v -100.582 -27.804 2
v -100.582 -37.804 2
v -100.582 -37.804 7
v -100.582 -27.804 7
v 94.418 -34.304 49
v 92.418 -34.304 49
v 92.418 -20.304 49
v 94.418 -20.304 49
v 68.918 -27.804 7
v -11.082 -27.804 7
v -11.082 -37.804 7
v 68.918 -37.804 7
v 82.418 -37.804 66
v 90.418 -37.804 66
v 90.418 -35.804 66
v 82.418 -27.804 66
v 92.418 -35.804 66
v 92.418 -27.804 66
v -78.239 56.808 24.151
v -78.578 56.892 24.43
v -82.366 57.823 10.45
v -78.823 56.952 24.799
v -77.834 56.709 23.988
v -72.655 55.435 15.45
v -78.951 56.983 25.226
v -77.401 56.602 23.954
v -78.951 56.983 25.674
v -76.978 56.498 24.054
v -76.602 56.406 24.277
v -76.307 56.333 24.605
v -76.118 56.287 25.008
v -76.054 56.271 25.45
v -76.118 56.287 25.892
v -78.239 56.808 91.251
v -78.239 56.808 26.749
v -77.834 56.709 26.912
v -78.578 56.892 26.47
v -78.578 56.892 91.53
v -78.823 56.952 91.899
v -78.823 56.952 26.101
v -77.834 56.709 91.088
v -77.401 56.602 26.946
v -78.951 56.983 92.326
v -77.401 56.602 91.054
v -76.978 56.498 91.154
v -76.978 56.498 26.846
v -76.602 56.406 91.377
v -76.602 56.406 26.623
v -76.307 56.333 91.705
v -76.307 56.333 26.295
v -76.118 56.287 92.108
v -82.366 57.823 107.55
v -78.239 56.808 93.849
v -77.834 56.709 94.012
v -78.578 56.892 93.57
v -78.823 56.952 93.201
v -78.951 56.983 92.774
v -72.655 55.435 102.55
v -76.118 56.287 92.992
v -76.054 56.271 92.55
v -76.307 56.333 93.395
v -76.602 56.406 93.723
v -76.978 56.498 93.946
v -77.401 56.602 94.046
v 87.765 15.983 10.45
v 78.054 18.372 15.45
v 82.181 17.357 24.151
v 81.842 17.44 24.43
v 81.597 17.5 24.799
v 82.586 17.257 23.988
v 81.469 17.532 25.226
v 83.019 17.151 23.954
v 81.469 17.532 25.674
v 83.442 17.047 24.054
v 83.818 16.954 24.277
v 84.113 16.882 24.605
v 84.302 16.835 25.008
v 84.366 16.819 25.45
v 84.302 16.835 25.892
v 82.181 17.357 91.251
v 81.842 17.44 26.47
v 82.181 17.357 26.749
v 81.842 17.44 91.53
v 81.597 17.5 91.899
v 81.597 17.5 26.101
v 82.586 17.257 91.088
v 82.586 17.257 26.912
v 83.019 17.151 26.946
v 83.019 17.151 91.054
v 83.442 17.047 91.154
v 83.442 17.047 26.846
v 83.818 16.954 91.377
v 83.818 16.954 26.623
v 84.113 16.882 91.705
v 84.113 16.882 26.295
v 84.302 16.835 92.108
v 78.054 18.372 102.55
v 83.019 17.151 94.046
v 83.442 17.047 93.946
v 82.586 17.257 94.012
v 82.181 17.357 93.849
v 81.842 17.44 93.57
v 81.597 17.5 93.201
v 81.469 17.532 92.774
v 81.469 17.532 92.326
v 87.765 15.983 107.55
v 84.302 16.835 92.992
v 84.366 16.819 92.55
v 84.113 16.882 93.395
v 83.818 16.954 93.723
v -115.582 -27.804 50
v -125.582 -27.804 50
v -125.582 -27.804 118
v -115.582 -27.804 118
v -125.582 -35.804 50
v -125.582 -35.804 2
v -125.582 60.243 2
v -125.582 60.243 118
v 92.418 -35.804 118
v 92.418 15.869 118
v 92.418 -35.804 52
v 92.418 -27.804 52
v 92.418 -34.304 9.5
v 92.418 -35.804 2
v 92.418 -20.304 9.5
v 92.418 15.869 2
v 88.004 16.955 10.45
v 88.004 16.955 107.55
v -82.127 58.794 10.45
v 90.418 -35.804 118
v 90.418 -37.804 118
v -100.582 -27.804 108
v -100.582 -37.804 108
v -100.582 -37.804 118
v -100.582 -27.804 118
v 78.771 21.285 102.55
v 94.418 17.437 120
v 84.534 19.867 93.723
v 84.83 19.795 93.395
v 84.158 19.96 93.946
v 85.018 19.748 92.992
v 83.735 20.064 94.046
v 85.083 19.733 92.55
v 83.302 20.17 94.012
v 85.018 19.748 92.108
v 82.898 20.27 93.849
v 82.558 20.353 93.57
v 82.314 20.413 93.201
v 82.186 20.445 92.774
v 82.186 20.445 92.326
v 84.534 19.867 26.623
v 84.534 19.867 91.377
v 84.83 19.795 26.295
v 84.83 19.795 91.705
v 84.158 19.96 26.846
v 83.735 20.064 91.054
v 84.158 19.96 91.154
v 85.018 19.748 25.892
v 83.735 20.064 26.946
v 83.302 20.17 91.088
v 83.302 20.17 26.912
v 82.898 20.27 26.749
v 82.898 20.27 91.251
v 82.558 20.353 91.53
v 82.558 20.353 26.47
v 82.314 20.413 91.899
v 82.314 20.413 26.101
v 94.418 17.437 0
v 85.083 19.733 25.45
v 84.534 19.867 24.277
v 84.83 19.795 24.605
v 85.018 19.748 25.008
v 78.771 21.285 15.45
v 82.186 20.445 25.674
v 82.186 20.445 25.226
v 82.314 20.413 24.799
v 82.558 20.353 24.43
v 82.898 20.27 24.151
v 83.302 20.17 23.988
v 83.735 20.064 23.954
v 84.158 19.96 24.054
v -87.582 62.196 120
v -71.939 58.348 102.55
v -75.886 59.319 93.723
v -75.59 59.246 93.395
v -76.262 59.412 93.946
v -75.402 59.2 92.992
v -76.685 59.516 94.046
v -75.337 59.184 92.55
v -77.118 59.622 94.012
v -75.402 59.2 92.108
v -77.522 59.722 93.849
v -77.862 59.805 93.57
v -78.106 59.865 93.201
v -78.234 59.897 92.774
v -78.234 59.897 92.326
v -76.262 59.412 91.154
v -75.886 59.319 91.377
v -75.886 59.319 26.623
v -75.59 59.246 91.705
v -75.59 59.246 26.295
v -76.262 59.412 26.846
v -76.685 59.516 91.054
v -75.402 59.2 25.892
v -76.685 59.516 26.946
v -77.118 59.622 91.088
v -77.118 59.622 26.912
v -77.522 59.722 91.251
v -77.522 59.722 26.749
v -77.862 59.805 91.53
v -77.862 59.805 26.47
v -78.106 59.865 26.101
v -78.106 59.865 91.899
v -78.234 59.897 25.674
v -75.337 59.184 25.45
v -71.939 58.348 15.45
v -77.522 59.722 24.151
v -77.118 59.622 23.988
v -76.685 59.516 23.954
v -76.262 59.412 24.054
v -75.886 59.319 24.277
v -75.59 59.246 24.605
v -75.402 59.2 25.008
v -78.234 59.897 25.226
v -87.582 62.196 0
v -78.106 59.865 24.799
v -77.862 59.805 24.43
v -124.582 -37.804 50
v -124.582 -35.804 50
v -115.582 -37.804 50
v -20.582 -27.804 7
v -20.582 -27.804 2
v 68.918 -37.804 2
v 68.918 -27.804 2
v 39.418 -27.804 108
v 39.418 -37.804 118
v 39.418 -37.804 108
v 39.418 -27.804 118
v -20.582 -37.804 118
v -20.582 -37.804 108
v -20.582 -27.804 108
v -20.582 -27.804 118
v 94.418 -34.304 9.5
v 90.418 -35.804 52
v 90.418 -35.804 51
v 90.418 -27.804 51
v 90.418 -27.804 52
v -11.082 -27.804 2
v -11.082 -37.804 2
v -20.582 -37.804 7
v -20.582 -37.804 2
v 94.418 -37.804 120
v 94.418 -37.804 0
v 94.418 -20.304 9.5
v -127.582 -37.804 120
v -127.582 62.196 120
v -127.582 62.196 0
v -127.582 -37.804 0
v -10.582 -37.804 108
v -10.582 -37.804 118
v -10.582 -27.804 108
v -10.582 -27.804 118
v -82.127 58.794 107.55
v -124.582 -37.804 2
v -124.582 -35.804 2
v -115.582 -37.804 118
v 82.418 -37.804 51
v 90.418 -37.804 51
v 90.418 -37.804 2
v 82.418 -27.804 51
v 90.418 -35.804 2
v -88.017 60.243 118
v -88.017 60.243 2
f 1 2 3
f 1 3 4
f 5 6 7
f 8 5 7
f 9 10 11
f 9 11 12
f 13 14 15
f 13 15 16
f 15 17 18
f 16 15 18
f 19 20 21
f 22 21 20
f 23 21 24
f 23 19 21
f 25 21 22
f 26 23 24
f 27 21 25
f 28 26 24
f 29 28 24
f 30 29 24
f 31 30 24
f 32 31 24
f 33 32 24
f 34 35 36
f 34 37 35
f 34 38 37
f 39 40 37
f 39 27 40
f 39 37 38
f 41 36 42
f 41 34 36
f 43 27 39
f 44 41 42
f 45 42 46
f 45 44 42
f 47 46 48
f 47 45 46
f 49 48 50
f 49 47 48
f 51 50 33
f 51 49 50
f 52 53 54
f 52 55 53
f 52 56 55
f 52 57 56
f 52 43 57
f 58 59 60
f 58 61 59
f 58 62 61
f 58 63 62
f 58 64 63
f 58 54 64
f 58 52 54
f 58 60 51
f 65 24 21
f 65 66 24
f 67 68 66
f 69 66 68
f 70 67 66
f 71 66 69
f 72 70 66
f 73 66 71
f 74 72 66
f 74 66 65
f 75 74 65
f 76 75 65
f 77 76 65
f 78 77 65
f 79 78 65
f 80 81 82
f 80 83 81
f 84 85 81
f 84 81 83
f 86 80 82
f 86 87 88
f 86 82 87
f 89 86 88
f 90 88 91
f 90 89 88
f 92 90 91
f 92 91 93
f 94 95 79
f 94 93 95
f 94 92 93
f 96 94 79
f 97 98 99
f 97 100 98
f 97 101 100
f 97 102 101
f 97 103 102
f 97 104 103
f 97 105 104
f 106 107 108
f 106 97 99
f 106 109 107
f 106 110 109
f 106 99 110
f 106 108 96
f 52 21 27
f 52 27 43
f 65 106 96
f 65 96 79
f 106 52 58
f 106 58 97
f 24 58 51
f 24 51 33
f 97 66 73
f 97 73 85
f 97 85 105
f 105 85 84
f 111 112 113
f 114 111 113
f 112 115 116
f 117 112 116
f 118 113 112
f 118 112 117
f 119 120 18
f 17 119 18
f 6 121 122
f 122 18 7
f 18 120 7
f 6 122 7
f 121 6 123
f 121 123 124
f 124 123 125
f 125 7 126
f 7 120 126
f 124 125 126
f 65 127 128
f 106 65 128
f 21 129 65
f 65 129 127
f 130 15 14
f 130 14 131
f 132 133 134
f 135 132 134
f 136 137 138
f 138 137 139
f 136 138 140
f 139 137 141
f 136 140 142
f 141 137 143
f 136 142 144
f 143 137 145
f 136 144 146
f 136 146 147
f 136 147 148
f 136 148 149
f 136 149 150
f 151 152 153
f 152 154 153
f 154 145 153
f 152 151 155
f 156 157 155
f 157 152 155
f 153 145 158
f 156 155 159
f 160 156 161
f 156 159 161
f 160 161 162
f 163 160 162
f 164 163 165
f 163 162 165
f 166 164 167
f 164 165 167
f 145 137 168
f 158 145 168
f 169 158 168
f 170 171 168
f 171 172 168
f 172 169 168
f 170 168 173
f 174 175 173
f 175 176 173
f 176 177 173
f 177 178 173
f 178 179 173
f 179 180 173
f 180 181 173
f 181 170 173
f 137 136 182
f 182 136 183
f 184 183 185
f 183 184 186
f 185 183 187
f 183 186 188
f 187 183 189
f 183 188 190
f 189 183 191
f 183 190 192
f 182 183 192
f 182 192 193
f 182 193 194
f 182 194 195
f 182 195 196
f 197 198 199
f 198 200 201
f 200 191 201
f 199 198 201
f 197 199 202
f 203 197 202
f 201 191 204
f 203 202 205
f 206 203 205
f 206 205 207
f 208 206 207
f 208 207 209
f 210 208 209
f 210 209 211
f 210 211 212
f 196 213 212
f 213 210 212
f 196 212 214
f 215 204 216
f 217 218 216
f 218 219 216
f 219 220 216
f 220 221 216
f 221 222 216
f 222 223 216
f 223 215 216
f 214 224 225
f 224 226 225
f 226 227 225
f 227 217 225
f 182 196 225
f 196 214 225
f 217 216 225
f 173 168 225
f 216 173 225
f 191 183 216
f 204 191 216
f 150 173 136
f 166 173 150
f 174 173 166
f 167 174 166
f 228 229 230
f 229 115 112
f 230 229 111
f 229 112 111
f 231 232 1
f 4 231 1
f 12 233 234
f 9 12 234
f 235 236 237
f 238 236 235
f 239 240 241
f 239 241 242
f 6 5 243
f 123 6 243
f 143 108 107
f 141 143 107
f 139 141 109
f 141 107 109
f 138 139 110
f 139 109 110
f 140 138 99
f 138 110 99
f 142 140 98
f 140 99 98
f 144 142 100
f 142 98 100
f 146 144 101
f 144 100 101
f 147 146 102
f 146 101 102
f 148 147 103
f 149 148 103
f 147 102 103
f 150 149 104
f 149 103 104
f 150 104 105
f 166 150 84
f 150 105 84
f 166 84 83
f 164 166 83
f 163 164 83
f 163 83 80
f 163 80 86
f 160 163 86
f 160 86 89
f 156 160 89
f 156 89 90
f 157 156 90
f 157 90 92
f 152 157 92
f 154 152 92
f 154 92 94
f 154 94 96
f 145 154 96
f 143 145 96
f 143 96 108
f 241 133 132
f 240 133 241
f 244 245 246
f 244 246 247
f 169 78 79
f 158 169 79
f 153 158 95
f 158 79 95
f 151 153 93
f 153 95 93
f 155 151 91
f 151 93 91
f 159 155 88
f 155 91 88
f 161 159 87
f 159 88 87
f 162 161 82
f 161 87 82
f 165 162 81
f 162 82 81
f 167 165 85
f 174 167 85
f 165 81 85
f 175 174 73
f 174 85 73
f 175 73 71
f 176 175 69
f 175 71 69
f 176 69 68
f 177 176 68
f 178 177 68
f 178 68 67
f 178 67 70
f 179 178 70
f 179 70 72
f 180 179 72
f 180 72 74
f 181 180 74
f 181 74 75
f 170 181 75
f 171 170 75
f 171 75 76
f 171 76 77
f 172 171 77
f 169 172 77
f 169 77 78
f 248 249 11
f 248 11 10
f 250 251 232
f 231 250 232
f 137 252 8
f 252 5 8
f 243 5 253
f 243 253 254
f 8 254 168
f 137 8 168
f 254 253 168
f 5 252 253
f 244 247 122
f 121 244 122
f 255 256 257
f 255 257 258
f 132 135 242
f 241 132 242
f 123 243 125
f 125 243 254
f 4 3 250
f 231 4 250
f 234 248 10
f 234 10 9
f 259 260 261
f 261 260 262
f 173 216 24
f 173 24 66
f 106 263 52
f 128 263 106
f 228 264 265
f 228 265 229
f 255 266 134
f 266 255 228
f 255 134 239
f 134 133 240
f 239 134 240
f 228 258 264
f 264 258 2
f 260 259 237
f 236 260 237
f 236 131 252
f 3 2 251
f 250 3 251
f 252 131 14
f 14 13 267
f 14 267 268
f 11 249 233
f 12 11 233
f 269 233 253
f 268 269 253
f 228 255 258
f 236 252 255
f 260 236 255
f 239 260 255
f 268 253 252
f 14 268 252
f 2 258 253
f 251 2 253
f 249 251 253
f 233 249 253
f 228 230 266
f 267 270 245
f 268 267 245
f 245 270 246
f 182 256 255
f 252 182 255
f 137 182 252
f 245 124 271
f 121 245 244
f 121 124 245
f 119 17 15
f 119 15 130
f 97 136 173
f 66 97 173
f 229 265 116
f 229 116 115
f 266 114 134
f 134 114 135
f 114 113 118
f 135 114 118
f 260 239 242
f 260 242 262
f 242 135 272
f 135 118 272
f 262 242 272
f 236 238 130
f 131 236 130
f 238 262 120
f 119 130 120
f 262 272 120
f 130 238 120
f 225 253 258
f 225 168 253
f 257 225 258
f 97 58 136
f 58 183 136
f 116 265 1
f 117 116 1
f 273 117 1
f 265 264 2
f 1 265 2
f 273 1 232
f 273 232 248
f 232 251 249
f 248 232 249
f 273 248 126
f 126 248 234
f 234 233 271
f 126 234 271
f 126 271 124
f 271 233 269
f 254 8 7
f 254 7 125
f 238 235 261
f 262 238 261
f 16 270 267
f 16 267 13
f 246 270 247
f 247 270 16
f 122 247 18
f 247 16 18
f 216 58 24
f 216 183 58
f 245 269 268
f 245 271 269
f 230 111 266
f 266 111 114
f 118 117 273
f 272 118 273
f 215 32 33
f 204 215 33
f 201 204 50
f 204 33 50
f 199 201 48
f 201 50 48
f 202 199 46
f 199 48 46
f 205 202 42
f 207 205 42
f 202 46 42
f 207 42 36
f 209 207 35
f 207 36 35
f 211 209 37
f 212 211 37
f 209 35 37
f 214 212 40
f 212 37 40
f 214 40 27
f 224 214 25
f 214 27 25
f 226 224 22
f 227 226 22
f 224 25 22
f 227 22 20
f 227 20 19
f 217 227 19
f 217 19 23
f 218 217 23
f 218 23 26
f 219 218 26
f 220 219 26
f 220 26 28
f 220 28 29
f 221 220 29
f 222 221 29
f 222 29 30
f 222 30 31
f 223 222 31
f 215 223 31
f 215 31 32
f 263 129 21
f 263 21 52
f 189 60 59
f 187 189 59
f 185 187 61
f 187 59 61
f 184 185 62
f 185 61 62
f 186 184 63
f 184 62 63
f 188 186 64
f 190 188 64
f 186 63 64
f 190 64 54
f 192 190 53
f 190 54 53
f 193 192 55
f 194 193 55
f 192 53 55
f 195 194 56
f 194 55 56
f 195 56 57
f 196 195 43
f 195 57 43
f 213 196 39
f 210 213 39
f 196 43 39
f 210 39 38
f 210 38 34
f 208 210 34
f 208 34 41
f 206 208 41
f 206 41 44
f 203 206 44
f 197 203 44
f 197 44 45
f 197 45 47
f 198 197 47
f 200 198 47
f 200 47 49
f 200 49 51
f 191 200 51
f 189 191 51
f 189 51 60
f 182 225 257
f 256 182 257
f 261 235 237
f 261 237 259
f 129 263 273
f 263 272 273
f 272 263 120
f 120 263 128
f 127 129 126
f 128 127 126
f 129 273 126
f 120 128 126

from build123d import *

# Parameters (mm, degrees)
BOSS_EXTRUDE1_DEPTH  = 118
SKETCH2_W            = 68
SKETCH2_H            = 10
BOSS_EXTRUDE2_DEPTH  = 12
SKETCH4_W            = 2
SKETCH4_H            = 5.241203994
BOSS_EXTRUDE4_DEPTH  = 118
SKETCH5_W            = 40
SKETCH5_H            = 14
CUT_EXTRUDE1_DEPTH   = 12
BOSS_EXTRUDE5_START  = -2
SKETCH6_W            = 0.5
SKETCH6_H            = 14
BOSS_EXTRUDE5_DEPTH  = 2
SKETCH7_W            = 118
SKETCH7_H            = 2
BOSS_EXTRUDE6_DEPTH  = 2
SKETCH8_W            = 2
SKETCH8_H            = 0.649840642
BOSS_EXTRUDE7_DEPTH  = 50
BOSS_EXTRUDE8_DEPTH  = 2
SKETCH11_W           = 222
SKETCH11_H           = 2
BOSS_EXTRUDE9_DEPTH  = 2
SKETCH13_W           = 118
SKETCH13_H           = 2
BOSS_EXTRUDE10_DEPTH = 4
SKETCH14_W           = 1
SKETCH14_H           = 46
CUT_EXTRUDE2_DEPTH   = 4
SKETCH15_W           = 215
SKETCH15_H           = 1
CUT_EXTRUDE3_DEPTH   = 4
SKETCH16_W           = 215
SKETCH16_H           = 1
CUT_EXTRUDE4_DEPTH   = 4
SKETCH17_W           = 155.2
SKETCH17_H           = 87.1
CUT_EXTRUDE5_DEPTH   = 4
SKETCH18_W           = 175.2
SKETCH18_H           = 97.1
BOSS_EXTRUDE11_DEPTH = 1
SKETCH19_W           = 155.2
SKETCH19_H           = 87.1
CUT_EXTRUDE6_DEPTH   = 1
SKETCH20_R           = 1.5
CUT_EXTRUDE7_DEPTH   = 47.46373967
SKETCH21_W           = 80
SKETCH21_H           = 10
BOSS_EXTRUDE12_DEPTH = 12
SKETCH22_W           = 80
SKETCH22_H           = 5
CUT_EXTRUDE8_DEPTH   = 12
SKETCH23_W           = 10
SKETCH23_H           = 10
BOSS_EXTRUDE13_DEPTH = 12
BOSS_EXTRUDE14_START = -10
SKETCH24_W           = 12
SKETCH24_H           = 4
BOSS_EXTRUDE14_DEPTH = 10
BOSS_EXTRUDE15_START = -10
SKETCH25_W           = 8
SKETCH25_H           = 1
BOSS_EXTRUDE15_DEPTH = 10
SKETCH27_W           = 80
SKETCH27_H           = 10
BOSS_EXTRUDE16_DEPTH = 5
BOSS_EXTRUDE17_DEPTH = 2
SKETCH30_W           = 80
SKETCH30_H           = 10
BOSS_EXTRUDE18_DEPTH = 10
SKETCH31_W           = 50
SKETCH31_H           = 11.87067785
BOSS_EXTRUDE20_DEPTH = 10
SKETCH32_W           = 50
SKETCH32_H           = 1.87
CUT_EXTRUDE9_DEPTH   = 10


with BuildPart() as part:
    # Sketch1 → Boss-Extrude1 (new body)
    with BuildSketch(Plane.XY):
        Polygon((94.417554234, -32.563143832), (94.417554234, 17.436856168), (-87.582445766, 62.195652174), (-127.582445766, 62.195652174), (-127.582445766, -37.804347826), (-125.582445766, -37.757129772), (-125.582445766, 60.242870228), (-88.016763075, 60.242870228), (92.417554234, 15.869118575), (92.417554234, 15.389638114), (92.417554234, -32.610361886), align=None)
    extrude(amount=BOSS_EXTRUDE1_DEPTH)

    # Sketch2 → Boss-Extrude2 (add)
    with BuildSketch(Plane.ZY.offset(127.582445766)):
        with Locations((84, -32.804347826)):
            Rectangle(SKETCH2_W, SKETCH2_H)
    extrude(amount=-BOSS_EXTRUDE2_DEPTH)

    # Sketch4 → Boss-Extrude4 (add)
    with BuildSketch(Plane.XY.offset(118)):
        with Locations((93.417554234, -35.183745829)):
            Rectangle(SKETCH4_W, SKETCH4_H)
    extrude(amount=-BOSS_EXTRUDE4_DEPTH)

    # Sketch5 → Cut-Extrude1 (cut)
    with BuildSketch(Plane(origin=(94.417554234, 0, 0), x_dir=(0, 0, -1), z_dir=(1, 0, 0))):
        with Locations((-29.5, -27.304347826)):
            Rectangle(SKETCH5_W, SKETCH5_H)
    extrude(amount=-CUT_EXTRUDE1_DEPTH, mode=Mode.SUBTRACT)

    # Sketch6 → Boss-Extrude5 (add)
    with BuildSketch(Plane(origin=(94.417554234, 0, 0), x_dir=(0, 0, -1), z_dir=(1, 0, 0)).offset(BOSS_EXTRUDE5_START)):
        with Locations((-49.25, -27.304347826)):
            Rectangle(SKETCH6_W, SKETCH6_H)
    extrude(amount=BOSS_EXTRUDE5_DEPTH)

    # Sketch7 → Boss-Extrude6 (add)
    with BuildSketch(Plane.ZY.offset(-92.417554234)):
        with Locations((59, -36.804347826)):
            Rectangle(SKETCH7_W, SKETCH7_H)
    extrude(amount=BOSS_EXTRUDE6_DEPTH)

    # Sketch8 → Boss-Extrude7 (add)
    with BuildSketch(Plane(origin=(0, 0, 50), x_dir=(-1, 0, 0), z_dir=(0, 0, -1))):
        with Locations((126.582445766, -37.479427505)):
            Rectangle(SKETCH8_W, SKETCH8_H)
    extrude(amount=BOSS_EXTRUDE7_DEPTH)

    # Sketch10 → Boss-Extrude8 (add)
    with BuildSketch(Plane(origin=(0, 0, 0), x_dir=(-1, 0, 0), z_dir=(0, 0, -1))):
        Polygon((-94.417554234, 17.436856168), (87.582445766, 62.195652174), (127.582445766, 62.195652174), (127.582445766, -37.804347826), (-94.417554234, -37.804347826), align=None)
    extrude(amount=-BOSS_EXTRUDE8_DEPTH)

    # Sketch11 → Boss-Extrude9 (add)
    with BuildSketch(Plane.XY.offset(2)):
        with Locations((-16.582445766, -36.804347826)):
            Rectangle(SKETCH11_W, SKETCH11_H)
    extrude(amount=BOSS_EXTRUDE9_DEPTH)

    # Sketch13 → Boss-Extrude10 (add)
    with BuildSketch(Plane.ZY.offset(127.582445766)):
        with Locations((59, -36.804347826)):
            Rectangle(SKETCH13_W, SKETCH13_H)
    extrude(amount=-BOSS_EXTRUDE10_DEPTH)

    # Sketch14 → Cut-Extrude2 (cut)
    with BuildSketch(Plane(origin=(0, -35.804347826, 0), x_dir=(1, 0, 0), z_dir=(0, 1, 0))):
        with Locations((-124.082445766, -27)):
            Rectangle(SKETCH14_W, SKETCH14_H)
    extrude(amount=-CUT_EXTRUDE2_DEPTH, mode=Mode.SUBTRACT)

    # Sketch15 → Cut-Extrude3 (cut)
    with BuildSketch(Plane.XZ.offset(37.804347826)):
        with Locations((-17.082445766, 3.5)):
            Rectangle(SKETCH15_W, SKETCH15_H)
    extrude(amount=-CUT_EXTRUDE3_DEPTH, mode=Mode.SUBTRACT)

    # Sketch16 → Cut-Extrude4 (cut)
    with BuildSketch(Plane.XZ.offset(37.804347826)):
        with Locations((-17.082445766, 2.5)):
            Rectangle(SKETCH16_W, SKETCH16_H)
    extrude(amount=-CUT_EXTRUDE4_DEPTH, mode=Mode.SUBTRACT)

    # Sketch17 → Cut-Extrude5 (cut)
    with BuildSketch(Plane(origin=(9.428373652, 38.338028676, 0), x_dir=(0.971065881, -0.238811756, 0), z_dir=(0.238811756, 0.971065881, 0))):
        with Locations((-6.191377784, -59)):
            Rectangle(SKETCH17_W, SKETCH17_H)
    extrude(amount=-CUT_EXTRUDE5_DEPTH, mode=Mode.SUBTRACT)

    # Sketch18 → Boss-Extrude11 (add)
    with BuildSketch(Plane(origin=(8.95075014, 36.395896914, 0), x_dir=(0.971065881, -0.238811756, 0), z_dir=(-0.238811756, -0.971065881, 0))):
        with Locations((-6.191377784, 59)):
            Rectangle(SKETCH18_W, SKETCH18_H)
    extrude(amount=BOSS_EXTRUDE11_DEPTH)

    # Sketch19 → Cut-Extrude6 (cut)
    with BuildSketch(Plane(origin=(8.95075014, 36.395896914, 0), x_dir=(0.971065881, -0.238811756, 0), z_dir=(0.238811756, 0.971065881, 0))):
        with Locations((-6.191377784, -59)):
            Rectangle(SKETCH19_W, SKETCH19_H)
    extrude(amount=-CUT_EXTRUDE6_DEPTH, mode=Mode.SUBTRACT)

    # Sketch20 → Cut-Extrude7 (cut, through all)
    with BuildSketch(Plane(origin=(8.711938383, 35.424831033, 0), x_dir=(0.971065881, -0.238811756, 0), z_dir=(-0.238811756, -0.971065881, 0))):
        with Locations((-88.791377784, 92.55)):
            Circle(SKETCH20_R)
        with Locations((-88.791377784, 25.45)):
            Circle(SKETCH20_R)
        with Locations((76.408622216, 25.45)):
            Circle(SKETCH20_R)
        with Locations((76.408622216, 92.55)):
            Circle(SKETCH20_R)
    extrude(amount=-CUT_EXTRUDE7_DEPTH, mode=Mode.SUBTRACT)

    # Sketch21 → Boss-Extrude12 (add)
    with BuildSketch(Plane(origin=(0, 0, 0), x_dir=(-1, 0, 0), z_dir=(0, 0, -1))):
        with Locations((60.582445766, -32.804347826)):
            Rectangle(SKETCH21_W, SKETCH21_H)
    extrude(amount=-BOSS_EXTRUDE12_DEPTH)

    # Sketch22 → Cut-Extrude8 (cut)
    with BuildSketch(Plane.XZ.offset(37.804347826)):
        with Locations((-60.582445766, 9.5)):
            Rectangle(SKETCH22_W, SKETCH22_H)
    extrude(amount=-CUT_EXTRUDE8_DEPTH, mode=Mode.SUBTRACT)

    # Sketch23 → Boss-Extrude13 (add)
    with BuildSketch(Plane(origin=(94.417554234, 0, 0), x_dir=(0, 0, -1), z_dir=(1, 0, 0))):
        with Locations((-61, -32.804347826)):
            Rectangle(SKETCH23_W, SKETCH23_H)
    extrude(amount=-BOSS_EXTRUDE13_DEPTH)

    # Sketch24 → Boss-Extrude14 (add)
    with BuildSketch(Plane.XZ.offset(37.804347826).offset(BOSS_EXTRUDE14_START)):
        with Locations((88.417554234, 54)):
            Rectangle(SKETCH24_W, SKETCH24_H)
    extrude(amount=BOSS_EXTRUDE14_DEPTH)

    # Sketch25 → Boss-Extrude15 (add)
    with BuildSketch(Plane.XZ.offset(37.804347826).offset(BOSS_EXTRUDE15_START)):
        with Locations((86.417554234, 51.5)):
            Rectangle(SKETCH25_W, SKETCH25_H)
    extrude(amount=BOSS_EXTRUDE15_DEPTH)

    # Sketch27 → Boss-Extrude16 (add)
    with BuildSketch(Plane.XY.offset(2)):
        with Locations((28.917554234, -32.804347826)):
            Rectangle(SKETCH27_W, SKETCH27_H)
    extrude(amount=BOSS_EXTRUDE16_DEPTH)

    # Sketch28 → Boss-Extrude17 (add)
    with BuildSketch(Plane.XY.offset(118)):
        Polygon((-127.582445766, -37.804347826), (94.417554234, -37.804347826), (94.417554234, 17.436856168), (-87.582445766, 62.195652174), (-127.582445766, 62.195652174), align=None)
    extrude(amount=BOSS_EXTRUDE17_DEPTH)

    # Sketch30 → Boss-Extrude18 (add)
    with BuildSketch(Plane.XZ.offset(37.804347826)):
        with Locations((-60.582445766, 113)):
            Rectangle(SKETCH30_W, SKETCH30_H)
    extrude(amount=-BOSS_EXTRUDE18_DEPTH)

    # Sketch31 → Boss-Extrude20 (add)
    with BuildSketch(Plane(origin=(0, 0, 118), x_dir=(-1, 0, 0), z_dir=(0, 0, -1))):
        with Locations((-14.417554234, -31.869008901)):
            Rectangle(SKETCH31_W, SKETCH31_H)
    extrude(amount=BOSS_EXTRUDE20_DEPTH)

    # Sketch32 → Cut-Extrude9 (cut)
    with BuildSketch(Plane(origin=(0, 0, 108), x_dir=(-1, 0, 0), z_dir=(0, 0, -1))):
        with Locations((-14.417554234, -26.868669976)):
            Rectangle(SKETCH32_W, SKETCH32_H)
    extrude(amount=-CUT_EXTRUDE9_DEPTH, mode=Mode.SUBTRACT)


solid = part.part
